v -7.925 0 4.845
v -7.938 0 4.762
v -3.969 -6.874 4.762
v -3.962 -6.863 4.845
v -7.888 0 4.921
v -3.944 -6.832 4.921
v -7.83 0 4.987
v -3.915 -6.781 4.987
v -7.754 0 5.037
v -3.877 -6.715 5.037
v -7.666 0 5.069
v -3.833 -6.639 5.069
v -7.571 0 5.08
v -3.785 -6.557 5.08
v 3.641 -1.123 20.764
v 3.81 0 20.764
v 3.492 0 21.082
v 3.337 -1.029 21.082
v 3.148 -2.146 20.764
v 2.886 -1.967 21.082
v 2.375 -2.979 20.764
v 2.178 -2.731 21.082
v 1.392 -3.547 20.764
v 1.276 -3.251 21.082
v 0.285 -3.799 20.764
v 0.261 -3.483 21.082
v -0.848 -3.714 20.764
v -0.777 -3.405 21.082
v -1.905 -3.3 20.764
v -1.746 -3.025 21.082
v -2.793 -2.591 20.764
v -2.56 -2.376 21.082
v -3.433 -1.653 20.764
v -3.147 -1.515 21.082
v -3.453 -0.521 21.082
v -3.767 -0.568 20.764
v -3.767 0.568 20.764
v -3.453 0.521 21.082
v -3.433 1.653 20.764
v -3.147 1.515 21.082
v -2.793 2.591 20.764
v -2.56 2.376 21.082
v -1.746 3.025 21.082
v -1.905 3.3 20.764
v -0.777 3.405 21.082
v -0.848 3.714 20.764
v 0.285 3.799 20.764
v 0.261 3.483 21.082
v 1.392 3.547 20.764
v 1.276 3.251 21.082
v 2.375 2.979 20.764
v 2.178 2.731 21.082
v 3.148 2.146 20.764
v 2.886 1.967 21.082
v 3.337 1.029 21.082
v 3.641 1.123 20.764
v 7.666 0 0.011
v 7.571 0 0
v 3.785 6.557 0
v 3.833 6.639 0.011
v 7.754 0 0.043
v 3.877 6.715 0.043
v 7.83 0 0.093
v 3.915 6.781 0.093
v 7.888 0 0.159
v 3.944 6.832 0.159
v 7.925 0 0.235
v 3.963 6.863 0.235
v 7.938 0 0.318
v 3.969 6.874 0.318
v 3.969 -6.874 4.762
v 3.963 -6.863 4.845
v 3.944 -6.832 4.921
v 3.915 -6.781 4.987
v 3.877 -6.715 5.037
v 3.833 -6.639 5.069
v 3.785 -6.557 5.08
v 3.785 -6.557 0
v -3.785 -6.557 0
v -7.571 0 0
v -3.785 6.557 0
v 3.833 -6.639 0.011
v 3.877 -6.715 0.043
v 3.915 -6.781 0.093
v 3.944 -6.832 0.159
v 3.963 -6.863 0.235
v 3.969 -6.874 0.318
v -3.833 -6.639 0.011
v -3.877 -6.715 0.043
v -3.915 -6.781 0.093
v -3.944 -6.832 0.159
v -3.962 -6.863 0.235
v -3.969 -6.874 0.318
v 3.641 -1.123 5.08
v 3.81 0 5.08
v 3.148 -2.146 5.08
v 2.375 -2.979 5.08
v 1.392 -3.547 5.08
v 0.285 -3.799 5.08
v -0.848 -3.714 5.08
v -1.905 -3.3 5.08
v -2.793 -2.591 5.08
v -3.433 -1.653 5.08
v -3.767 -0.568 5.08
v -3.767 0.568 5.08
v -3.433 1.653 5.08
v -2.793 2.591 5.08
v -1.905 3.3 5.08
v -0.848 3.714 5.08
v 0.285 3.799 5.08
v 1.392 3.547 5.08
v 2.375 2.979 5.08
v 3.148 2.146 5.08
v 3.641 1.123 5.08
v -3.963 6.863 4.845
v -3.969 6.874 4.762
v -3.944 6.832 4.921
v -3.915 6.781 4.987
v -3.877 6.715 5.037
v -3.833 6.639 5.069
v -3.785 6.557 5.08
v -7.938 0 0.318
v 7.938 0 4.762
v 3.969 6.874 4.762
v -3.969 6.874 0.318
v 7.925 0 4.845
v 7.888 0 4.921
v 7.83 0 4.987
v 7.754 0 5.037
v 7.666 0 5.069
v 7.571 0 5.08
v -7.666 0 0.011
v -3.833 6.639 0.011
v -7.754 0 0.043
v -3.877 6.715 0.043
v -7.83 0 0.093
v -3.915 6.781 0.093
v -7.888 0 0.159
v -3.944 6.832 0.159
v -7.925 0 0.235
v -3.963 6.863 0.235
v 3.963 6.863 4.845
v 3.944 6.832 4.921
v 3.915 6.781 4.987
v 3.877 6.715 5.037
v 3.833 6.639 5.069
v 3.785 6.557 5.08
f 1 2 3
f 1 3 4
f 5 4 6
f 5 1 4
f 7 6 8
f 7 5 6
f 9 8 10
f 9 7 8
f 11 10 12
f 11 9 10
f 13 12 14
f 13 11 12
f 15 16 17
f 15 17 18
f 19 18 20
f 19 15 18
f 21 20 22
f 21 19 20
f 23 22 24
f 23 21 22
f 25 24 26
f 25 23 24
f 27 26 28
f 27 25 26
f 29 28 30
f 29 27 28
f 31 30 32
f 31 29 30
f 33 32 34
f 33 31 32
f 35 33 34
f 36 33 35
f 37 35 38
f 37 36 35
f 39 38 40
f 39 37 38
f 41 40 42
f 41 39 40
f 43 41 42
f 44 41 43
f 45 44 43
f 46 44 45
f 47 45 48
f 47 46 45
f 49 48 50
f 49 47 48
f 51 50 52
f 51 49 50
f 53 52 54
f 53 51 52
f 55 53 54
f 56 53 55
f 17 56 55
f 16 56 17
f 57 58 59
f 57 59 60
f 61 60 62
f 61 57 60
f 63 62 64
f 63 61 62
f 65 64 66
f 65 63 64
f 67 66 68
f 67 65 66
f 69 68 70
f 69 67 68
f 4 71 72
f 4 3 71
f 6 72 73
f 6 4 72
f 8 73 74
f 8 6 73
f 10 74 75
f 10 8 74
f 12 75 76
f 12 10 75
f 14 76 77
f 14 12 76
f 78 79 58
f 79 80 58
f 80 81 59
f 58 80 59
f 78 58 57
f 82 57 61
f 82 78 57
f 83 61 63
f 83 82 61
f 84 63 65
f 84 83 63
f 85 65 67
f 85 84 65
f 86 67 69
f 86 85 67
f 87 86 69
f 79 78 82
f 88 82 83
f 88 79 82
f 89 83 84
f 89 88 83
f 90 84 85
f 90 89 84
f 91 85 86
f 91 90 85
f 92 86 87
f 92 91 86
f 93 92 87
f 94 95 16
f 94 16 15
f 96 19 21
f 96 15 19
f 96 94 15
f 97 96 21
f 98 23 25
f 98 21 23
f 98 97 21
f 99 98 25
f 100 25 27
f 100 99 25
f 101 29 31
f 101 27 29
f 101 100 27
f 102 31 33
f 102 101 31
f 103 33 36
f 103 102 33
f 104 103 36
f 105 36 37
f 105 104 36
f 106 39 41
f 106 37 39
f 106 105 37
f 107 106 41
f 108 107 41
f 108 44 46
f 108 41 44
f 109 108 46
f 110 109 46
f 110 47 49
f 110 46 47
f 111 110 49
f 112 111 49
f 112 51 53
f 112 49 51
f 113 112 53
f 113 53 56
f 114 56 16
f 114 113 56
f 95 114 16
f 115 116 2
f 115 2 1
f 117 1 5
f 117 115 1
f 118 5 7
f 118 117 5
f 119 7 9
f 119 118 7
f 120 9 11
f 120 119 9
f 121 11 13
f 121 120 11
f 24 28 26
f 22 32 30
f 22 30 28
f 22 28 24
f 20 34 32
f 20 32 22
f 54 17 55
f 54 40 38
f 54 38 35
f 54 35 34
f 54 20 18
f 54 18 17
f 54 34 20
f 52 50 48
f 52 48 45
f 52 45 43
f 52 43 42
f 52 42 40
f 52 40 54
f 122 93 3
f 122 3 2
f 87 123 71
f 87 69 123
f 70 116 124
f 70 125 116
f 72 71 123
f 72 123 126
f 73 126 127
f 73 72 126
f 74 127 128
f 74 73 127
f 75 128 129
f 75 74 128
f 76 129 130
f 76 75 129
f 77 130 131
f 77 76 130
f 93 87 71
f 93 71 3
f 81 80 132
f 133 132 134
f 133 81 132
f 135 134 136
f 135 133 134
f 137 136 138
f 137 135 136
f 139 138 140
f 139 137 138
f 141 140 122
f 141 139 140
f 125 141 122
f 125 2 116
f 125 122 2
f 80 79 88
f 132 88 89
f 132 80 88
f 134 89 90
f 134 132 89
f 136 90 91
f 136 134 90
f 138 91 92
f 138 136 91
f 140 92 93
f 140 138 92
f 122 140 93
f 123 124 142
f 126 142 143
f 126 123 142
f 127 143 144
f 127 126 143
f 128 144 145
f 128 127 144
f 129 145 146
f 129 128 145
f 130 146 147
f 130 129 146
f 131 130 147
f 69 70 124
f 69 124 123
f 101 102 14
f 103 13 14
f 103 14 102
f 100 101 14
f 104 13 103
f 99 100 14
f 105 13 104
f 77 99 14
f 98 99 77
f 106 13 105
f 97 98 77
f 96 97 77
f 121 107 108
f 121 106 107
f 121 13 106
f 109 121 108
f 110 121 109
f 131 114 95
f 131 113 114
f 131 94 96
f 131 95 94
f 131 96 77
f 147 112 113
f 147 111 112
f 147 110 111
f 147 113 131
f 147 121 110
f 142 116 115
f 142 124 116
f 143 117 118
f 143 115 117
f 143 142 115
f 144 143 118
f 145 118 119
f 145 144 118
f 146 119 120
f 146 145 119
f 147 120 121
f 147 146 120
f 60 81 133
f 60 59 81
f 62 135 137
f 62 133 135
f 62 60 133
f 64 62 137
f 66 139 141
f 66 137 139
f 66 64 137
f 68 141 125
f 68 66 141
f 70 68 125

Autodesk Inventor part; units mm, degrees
ref_plane "YZ Plane" through (0, 0, 0) normal (1, 0, 0) x (0, 1, 0)
ref_plane "XZ Plane" through (0, 0, 0) normal (0, 1, 0) x (-1, 0, 0)
ref_plane "XY Plane" through (0, 0, 0) normal (0, 0, 1) x (1, 0, 0)
sketch "Sketch1" plane through (0, 0, 0) normal (0, 0, 1) x (1, 0, 0)
  line L0 (7.9375, 0) -> (3.9688, -6.8741)
  line L1 (3.9688, -6.8741) -> (-3.9687, -6.8741)
  line L2 (-3.9687, -6.8741) -> (-7.9375, 0)
  line L3 (-7.9375, 0) -> (-3.9688, 6.8741)
  line L4 (-3.9688, 6.8741) -> (3.9688, 6.8741)
  line L5 (3.9688, 6.8741) -> (7.9375, 0)
  point P0 (0, 0)
  point P1 (0, 0)
  dimension "d0" = 15.875
extrude "Extrusion1" add sketch "Sketch1" along normal blind 5.08
sketch "Sketch2" plane through (0, 0, 5.08) normal (0, 0, 1) x (1, 0, 0)
  circle A0 centre (0, 0) radius 3.81
  dimension "d3" = 7.62
extrude "Extrusion2" add sketch "Sketch2" along normal blind 16.002
thread "Thread1" size "10-24 UNC" class "2A" standard "ANSI Unified Screw Threads" full length
chamfer "Chamfer1" distance 0.3175 angle 45 1 edges at (-3.81, 0, 21.082)
fillet "Fillet1" radius 0.3175 12 edges at (5.9531, 3.437, 5.08) (0, 6.8741, 5.08) (-5.9531, 3.437, 5.08) (-5.9531, -3.437, 5.08) (0, -6.8741, 5.08) (5.9531, -3.437, 5.08) (5.9531, -3.437, 0) (0, -6.8741, 0) (-5.9531, -3.437, 0) (-5.9531, 3.437, 0) (0, 6.8741, 0) (5.9531, 3.437, 0)
properties part number "Small Bolt"
